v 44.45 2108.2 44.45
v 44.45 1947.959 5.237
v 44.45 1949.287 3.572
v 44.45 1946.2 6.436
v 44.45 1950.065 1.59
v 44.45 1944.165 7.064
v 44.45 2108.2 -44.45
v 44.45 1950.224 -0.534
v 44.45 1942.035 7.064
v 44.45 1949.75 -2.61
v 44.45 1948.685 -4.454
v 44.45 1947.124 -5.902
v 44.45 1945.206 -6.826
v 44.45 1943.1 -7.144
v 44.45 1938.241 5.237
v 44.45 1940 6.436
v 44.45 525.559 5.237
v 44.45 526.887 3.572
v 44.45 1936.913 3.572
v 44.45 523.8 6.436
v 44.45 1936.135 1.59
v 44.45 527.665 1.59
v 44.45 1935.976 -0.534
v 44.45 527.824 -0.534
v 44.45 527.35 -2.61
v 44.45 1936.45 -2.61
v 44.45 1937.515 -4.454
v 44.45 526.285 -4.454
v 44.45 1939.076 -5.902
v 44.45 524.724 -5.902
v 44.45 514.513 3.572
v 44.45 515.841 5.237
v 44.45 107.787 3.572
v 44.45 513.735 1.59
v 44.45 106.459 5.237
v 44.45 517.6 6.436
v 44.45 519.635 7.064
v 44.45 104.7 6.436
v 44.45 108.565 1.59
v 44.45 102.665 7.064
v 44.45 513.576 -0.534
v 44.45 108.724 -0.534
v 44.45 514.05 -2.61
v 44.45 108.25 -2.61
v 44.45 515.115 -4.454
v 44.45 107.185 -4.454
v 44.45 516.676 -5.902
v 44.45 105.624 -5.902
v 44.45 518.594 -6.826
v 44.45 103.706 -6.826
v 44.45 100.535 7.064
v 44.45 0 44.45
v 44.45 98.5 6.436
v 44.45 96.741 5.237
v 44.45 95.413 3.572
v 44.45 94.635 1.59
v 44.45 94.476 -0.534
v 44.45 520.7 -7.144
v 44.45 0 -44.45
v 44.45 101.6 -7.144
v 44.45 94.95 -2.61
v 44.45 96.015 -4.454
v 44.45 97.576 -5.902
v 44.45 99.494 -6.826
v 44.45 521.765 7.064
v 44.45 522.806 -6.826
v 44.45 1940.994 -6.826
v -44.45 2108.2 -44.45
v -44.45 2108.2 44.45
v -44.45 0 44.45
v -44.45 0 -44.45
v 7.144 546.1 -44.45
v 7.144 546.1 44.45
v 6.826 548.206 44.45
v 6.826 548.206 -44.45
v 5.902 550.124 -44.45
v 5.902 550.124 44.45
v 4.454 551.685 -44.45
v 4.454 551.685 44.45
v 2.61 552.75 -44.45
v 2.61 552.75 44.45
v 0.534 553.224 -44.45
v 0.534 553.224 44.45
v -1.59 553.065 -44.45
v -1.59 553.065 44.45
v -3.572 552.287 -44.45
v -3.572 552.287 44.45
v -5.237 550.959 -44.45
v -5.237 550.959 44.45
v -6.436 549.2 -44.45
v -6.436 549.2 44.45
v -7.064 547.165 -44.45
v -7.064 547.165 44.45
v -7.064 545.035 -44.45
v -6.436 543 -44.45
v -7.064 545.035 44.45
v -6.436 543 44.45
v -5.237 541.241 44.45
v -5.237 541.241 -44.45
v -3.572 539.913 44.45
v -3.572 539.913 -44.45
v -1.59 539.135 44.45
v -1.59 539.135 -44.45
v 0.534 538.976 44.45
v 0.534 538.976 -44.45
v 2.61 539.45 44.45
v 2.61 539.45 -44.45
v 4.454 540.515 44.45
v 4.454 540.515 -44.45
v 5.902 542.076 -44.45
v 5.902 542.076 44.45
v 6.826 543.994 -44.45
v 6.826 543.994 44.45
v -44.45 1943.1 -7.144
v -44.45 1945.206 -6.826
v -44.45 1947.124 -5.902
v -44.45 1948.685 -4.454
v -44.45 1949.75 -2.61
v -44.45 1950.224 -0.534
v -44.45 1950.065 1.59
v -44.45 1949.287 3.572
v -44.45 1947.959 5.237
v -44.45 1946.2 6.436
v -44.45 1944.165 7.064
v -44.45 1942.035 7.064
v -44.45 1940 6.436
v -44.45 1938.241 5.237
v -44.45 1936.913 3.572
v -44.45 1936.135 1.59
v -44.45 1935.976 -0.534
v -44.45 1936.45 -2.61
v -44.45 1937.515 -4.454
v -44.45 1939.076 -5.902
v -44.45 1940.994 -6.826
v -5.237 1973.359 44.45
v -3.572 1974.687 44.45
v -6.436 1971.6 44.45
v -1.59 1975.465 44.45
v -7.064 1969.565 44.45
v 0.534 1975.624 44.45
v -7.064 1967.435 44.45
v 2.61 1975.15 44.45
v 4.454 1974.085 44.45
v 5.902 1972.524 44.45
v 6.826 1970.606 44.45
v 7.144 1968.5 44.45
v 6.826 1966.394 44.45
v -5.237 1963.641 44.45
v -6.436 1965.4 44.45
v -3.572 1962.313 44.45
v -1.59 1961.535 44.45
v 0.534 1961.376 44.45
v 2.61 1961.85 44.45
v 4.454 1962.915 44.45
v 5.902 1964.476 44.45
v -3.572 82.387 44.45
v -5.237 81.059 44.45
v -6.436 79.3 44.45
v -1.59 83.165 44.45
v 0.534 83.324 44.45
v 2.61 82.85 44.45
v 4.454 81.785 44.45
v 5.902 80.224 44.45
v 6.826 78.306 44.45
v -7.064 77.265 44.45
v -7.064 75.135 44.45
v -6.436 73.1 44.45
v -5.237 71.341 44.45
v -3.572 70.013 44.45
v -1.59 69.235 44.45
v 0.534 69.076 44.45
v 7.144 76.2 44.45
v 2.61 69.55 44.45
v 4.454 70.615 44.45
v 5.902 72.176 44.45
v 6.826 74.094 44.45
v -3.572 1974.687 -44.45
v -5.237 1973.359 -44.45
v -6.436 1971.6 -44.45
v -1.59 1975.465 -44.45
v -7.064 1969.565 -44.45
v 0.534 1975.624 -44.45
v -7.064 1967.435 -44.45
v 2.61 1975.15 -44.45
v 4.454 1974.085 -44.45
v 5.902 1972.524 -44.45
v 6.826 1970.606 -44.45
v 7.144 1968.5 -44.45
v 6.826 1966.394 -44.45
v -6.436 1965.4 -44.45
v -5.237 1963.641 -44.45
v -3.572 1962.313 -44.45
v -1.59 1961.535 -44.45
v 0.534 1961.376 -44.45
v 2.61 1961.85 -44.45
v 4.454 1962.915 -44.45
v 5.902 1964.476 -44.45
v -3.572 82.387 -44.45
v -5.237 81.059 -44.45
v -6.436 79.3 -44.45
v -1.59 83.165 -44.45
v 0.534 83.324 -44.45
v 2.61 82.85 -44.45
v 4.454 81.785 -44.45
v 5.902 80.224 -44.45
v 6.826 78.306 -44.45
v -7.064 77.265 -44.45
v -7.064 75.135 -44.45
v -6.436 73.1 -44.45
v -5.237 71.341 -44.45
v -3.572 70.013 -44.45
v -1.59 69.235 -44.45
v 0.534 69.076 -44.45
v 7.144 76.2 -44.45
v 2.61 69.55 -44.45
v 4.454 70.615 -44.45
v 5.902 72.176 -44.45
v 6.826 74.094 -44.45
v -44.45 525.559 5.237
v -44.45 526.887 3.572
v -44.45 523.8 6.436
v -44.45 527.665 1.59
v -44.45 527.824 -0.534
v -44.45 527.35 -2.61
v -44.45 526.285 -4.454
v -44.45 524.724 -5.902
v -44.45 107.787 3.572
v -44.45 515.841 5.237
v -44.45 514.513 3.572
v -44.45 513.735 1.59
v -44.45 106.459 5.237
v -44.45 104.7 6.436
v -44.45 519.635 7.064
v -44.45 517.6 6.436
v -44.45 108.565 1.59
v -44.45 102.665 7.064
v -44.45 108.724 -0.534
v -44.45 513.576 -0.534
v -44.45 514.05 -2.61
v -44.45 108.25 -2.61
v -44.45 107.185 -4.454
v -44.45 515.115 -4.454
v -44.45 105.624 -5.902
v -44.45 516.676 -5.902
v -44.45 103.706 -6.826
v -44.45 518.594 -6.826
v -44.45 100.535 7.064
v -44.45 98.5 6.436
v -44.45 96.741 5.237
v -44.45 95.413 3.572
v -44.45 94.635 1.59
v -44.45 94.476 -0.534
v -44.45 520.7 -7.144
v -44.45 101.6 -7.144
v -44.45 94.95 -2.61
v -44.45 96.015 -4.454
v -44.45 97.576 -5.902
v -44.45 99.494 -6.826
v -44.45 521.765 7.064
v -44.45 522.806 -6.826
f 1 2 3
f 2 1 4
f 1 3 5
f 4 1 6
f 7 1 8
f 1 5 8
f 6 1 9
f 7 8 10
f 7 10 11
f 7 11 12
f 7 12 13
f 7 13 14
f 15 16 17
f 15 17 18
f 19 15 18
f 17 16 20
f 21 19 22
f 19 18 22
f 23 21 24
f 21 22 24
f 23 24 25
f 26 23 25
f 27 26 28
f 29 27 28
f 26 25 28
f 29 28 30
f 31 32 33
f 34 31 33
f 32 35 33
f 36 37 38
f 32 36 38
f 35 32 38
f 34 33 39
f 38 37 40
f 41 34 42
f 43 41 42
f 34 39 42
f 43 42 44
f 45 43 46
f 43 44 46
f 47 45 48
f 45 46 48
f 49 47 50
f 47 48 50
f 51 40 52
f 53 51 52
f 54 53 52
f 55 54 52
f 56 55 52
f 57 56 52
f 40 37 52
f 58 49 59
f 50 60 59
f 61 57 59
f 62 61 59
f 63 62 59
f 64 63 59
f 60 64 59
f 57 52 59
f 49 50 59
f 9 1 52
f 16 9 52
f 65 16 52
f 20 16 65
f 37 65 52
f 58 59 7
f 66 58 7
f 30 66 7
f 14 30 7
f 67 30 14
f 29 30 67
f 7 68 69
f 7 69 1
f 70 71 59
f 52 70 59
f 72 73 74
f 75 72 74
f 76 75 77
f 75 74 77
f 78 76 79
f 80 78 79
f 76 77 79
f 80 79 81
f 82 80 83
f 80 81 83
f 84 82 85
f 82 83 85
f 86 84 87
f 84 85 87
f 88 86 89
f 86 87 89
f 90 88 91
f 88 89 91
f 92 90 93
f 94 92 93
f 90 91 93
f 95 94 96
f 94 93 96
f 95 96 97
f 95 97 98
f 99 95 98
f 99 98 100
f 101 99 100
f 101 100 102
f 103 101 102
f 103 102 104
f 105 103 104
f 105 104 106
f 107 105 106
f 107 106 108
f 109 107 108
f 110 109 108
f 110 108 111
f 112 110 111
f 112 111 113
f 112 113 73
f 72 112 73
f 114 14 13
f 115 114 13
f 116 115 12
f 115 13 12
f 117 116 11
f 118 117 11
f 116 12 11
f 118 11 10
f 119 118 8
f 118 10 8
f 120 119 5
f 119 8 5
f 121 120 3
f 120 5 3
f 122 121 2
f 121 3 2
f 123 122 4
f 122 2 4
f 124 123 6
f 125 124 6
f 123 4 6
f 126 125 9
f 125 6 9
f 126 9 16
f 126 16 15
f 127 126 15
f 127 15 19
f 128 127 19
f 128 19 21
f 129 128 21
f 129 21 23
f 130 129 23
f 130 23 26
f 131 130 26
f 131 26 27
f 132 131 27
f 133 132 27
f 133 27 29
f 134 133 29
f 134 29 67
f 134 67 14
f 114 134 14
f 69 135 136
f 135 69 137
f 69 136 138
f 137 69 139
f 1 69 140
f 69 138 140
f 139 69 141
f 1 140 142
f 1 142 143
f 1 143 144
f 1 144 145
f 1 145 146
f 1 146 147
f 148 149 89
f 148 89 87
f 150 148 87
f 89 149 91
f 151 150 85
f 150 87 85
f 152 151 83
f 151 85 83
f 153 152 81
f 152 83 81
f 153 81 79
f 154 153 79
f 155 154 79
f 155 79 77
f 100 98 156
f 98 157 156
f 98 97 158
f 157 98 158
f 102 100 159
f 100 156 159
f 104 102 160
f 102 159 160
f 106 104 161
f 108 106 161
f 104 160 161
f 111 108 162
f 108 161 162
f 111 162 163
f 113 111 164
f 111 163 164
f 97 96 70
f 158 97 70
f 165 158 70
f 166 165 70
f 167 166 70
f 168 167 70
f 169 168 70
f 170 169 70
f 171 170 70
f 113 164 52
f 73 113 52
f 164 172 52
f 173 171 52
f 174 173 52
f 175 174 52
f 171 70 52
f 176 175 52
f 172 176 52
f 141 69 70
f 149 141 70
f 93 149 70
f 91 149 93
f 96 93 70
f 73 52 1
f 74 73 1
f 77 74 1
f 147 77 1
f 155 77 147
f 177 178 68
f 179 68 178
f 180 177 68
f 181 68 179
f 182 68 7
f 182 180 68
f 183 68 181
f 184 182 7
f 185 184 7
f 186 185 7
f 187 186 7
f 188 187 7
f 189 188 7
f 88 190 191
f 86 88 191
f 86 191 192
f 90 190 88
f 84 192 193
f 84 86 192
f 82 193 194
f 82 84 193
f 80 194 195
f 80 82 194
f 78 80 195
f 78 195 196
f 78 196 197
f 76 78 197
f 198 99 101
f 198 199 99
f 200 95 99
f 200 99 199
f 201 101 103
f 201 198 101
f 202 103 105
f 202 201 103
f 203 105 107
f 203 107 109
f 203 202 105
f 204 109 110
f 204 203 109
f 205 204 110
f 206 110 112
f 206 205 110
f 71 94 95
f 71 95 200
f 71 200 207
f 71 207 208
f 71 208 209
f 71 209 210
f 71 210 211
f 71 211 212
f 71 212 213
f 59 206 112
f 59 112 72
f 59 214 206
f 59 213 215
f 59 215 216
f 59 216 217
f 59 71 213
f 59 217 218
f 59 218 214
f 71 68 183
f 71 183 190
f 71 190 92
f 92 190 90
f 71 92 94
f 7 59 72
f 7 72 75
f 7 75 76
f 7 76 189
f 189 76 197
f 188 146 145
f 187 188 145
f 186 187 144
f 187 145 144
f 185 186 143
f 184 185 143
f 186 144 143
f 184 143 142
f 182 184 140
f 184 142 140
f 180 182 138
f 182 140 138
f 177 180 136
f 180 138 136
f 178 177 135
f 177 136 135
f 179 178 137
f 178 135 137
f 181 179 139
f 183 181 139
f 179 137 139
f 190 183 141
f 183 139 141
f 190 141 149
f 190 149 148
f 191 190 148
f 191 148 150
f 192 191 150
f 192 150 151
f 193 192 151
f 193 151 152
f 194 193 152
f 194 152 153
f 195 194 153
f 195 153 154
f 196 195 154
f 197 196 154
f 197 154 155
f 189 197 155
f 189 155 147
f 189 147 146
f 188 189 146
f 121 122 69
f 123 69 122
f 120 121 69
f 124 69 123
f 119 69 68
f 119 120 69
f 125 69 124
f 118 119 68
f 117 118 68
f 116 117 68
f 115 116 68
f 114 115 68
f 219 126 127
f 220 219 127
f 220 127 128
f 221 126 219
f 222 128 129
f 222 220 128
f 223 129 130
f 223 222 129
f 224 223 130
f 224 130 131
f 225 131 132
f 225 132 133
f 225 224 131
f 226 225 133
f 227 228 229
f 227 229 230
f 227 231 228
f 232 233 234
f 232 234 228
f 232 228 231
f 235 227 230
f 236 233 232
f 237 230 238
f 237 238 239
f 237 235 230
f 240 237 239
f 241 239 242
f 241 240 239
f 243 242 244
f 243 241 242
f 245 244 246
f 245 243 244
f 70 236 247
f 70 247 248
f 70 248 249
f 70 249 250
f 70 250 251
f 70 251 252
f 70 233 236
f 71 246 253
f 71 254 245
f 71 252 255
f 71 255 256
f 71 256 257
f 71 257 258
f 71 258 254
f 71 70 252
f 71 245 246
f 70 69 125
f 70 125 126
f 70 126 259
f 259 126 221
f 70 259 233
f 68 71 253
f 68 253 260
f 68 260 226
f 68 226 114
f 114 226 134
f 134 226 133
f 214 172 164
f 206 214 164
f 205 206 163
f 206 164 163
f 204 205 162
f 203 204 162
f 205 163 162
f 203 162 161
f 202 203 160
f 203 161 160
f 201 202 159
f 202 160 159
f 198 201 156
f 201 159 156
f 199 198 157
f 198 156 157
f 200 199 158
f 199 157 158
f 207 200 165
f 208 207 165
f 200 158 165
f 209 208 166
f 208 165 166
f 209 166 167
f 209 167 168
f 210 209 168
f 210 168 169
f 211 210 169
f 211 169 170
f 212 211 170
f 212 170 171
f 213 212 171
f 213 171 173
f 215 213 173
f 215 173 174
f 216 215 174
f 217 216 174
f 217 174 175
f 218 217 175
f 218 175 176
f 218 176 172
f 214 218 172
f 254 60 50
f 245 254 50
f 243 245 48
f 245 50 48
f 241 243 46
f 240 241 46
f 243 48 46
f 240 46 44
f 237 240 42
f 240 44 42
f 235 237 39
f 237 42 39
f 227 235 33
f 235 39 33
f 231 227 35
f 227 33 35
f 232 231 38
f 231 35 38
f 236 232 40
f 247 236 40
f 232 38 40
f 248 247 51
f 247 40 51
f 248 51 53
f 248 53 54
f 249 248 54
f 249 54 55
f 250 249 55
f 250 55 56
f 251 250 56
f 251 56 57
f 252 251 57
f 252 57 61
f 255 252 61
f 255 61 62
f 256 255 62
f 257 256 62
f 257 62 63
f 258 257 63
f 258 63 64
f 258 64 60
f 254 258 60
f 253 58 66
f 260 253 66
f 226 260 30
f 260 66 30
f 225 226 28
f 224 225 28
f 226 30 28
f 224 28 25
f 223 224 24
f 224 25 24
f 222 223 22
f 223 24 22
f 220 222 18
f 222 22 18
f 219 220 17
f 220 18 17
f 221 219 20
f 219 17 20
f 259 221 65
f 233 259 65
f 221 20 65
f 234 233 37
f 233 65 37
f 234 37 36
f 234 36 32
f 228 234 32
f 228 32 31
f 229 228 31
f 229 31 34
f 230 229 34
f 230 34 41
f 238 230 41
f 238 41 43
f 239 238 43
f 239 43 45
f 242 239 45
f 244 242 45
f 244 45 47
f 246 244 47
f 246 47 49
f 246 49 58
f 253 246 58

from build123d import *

# Parameters (mm, degrees)
SKETCH1_W           = 88.9
SKETCH1_H           = 88.9
BOSS_EXTRUDE2_DEPTH = 2108.2
SKETCH2_R           = 7.14375
CUT_EXTRUDE1_DEPTH  = 89.9
SKETCH3_R           = 7.14375
CUT_EXTRUDE2_DEPTH  = 89.9


with BuildPart() as part:
    # Sketch1 → Boss-Extrude2 (new body)
    with BuildSketch(Plane(origin=(0, 0, 0), x_dir=(1, 0, 0), z_dir=(0, 1, 0))):
        Rectangle(SKETCH1_W, SKETCH1_H)
    extrude(amount=BOSS_EXTRUDE2_DEPTH)

    # Sketch2 → Cut-Extrude1 (cut, through all)
    with BuildSketch(Plane.XY.offset(44.45)):
        with Locations((0, 76.2)):
            Circle(SKETCH2_R)
        with Locations((0, 546.1)):
            Circle(SKETCH2_R)
        with Locations((0, 1968.5)):
            Circle(SKETCH2_R)
    extrude(amount=-CUT_EXTRUDE1_DEPTH, mode=Mode.SUBTRACT)

    # Sketch3 → Cut-Extrude2 (cut, through all)
    with BuildSketch(Plane(origin=(44.45, 0, 0), x_dir=(0, 0, -1), z_dir=(1, 0, 0))):
        with Locations((0, 101.6)):
            Circle(SKETCH3_R)
        with Locations((0, 520.7)):
            Circle(SKETCH3_R)
        with Locations((0, 1943.1)):
            Circle(SKETCH3_R)
    extrude(amount=-CUT_EXTRUDE2_DEPTH, mode=Mode.SUBTRACT)


solid = part.part
